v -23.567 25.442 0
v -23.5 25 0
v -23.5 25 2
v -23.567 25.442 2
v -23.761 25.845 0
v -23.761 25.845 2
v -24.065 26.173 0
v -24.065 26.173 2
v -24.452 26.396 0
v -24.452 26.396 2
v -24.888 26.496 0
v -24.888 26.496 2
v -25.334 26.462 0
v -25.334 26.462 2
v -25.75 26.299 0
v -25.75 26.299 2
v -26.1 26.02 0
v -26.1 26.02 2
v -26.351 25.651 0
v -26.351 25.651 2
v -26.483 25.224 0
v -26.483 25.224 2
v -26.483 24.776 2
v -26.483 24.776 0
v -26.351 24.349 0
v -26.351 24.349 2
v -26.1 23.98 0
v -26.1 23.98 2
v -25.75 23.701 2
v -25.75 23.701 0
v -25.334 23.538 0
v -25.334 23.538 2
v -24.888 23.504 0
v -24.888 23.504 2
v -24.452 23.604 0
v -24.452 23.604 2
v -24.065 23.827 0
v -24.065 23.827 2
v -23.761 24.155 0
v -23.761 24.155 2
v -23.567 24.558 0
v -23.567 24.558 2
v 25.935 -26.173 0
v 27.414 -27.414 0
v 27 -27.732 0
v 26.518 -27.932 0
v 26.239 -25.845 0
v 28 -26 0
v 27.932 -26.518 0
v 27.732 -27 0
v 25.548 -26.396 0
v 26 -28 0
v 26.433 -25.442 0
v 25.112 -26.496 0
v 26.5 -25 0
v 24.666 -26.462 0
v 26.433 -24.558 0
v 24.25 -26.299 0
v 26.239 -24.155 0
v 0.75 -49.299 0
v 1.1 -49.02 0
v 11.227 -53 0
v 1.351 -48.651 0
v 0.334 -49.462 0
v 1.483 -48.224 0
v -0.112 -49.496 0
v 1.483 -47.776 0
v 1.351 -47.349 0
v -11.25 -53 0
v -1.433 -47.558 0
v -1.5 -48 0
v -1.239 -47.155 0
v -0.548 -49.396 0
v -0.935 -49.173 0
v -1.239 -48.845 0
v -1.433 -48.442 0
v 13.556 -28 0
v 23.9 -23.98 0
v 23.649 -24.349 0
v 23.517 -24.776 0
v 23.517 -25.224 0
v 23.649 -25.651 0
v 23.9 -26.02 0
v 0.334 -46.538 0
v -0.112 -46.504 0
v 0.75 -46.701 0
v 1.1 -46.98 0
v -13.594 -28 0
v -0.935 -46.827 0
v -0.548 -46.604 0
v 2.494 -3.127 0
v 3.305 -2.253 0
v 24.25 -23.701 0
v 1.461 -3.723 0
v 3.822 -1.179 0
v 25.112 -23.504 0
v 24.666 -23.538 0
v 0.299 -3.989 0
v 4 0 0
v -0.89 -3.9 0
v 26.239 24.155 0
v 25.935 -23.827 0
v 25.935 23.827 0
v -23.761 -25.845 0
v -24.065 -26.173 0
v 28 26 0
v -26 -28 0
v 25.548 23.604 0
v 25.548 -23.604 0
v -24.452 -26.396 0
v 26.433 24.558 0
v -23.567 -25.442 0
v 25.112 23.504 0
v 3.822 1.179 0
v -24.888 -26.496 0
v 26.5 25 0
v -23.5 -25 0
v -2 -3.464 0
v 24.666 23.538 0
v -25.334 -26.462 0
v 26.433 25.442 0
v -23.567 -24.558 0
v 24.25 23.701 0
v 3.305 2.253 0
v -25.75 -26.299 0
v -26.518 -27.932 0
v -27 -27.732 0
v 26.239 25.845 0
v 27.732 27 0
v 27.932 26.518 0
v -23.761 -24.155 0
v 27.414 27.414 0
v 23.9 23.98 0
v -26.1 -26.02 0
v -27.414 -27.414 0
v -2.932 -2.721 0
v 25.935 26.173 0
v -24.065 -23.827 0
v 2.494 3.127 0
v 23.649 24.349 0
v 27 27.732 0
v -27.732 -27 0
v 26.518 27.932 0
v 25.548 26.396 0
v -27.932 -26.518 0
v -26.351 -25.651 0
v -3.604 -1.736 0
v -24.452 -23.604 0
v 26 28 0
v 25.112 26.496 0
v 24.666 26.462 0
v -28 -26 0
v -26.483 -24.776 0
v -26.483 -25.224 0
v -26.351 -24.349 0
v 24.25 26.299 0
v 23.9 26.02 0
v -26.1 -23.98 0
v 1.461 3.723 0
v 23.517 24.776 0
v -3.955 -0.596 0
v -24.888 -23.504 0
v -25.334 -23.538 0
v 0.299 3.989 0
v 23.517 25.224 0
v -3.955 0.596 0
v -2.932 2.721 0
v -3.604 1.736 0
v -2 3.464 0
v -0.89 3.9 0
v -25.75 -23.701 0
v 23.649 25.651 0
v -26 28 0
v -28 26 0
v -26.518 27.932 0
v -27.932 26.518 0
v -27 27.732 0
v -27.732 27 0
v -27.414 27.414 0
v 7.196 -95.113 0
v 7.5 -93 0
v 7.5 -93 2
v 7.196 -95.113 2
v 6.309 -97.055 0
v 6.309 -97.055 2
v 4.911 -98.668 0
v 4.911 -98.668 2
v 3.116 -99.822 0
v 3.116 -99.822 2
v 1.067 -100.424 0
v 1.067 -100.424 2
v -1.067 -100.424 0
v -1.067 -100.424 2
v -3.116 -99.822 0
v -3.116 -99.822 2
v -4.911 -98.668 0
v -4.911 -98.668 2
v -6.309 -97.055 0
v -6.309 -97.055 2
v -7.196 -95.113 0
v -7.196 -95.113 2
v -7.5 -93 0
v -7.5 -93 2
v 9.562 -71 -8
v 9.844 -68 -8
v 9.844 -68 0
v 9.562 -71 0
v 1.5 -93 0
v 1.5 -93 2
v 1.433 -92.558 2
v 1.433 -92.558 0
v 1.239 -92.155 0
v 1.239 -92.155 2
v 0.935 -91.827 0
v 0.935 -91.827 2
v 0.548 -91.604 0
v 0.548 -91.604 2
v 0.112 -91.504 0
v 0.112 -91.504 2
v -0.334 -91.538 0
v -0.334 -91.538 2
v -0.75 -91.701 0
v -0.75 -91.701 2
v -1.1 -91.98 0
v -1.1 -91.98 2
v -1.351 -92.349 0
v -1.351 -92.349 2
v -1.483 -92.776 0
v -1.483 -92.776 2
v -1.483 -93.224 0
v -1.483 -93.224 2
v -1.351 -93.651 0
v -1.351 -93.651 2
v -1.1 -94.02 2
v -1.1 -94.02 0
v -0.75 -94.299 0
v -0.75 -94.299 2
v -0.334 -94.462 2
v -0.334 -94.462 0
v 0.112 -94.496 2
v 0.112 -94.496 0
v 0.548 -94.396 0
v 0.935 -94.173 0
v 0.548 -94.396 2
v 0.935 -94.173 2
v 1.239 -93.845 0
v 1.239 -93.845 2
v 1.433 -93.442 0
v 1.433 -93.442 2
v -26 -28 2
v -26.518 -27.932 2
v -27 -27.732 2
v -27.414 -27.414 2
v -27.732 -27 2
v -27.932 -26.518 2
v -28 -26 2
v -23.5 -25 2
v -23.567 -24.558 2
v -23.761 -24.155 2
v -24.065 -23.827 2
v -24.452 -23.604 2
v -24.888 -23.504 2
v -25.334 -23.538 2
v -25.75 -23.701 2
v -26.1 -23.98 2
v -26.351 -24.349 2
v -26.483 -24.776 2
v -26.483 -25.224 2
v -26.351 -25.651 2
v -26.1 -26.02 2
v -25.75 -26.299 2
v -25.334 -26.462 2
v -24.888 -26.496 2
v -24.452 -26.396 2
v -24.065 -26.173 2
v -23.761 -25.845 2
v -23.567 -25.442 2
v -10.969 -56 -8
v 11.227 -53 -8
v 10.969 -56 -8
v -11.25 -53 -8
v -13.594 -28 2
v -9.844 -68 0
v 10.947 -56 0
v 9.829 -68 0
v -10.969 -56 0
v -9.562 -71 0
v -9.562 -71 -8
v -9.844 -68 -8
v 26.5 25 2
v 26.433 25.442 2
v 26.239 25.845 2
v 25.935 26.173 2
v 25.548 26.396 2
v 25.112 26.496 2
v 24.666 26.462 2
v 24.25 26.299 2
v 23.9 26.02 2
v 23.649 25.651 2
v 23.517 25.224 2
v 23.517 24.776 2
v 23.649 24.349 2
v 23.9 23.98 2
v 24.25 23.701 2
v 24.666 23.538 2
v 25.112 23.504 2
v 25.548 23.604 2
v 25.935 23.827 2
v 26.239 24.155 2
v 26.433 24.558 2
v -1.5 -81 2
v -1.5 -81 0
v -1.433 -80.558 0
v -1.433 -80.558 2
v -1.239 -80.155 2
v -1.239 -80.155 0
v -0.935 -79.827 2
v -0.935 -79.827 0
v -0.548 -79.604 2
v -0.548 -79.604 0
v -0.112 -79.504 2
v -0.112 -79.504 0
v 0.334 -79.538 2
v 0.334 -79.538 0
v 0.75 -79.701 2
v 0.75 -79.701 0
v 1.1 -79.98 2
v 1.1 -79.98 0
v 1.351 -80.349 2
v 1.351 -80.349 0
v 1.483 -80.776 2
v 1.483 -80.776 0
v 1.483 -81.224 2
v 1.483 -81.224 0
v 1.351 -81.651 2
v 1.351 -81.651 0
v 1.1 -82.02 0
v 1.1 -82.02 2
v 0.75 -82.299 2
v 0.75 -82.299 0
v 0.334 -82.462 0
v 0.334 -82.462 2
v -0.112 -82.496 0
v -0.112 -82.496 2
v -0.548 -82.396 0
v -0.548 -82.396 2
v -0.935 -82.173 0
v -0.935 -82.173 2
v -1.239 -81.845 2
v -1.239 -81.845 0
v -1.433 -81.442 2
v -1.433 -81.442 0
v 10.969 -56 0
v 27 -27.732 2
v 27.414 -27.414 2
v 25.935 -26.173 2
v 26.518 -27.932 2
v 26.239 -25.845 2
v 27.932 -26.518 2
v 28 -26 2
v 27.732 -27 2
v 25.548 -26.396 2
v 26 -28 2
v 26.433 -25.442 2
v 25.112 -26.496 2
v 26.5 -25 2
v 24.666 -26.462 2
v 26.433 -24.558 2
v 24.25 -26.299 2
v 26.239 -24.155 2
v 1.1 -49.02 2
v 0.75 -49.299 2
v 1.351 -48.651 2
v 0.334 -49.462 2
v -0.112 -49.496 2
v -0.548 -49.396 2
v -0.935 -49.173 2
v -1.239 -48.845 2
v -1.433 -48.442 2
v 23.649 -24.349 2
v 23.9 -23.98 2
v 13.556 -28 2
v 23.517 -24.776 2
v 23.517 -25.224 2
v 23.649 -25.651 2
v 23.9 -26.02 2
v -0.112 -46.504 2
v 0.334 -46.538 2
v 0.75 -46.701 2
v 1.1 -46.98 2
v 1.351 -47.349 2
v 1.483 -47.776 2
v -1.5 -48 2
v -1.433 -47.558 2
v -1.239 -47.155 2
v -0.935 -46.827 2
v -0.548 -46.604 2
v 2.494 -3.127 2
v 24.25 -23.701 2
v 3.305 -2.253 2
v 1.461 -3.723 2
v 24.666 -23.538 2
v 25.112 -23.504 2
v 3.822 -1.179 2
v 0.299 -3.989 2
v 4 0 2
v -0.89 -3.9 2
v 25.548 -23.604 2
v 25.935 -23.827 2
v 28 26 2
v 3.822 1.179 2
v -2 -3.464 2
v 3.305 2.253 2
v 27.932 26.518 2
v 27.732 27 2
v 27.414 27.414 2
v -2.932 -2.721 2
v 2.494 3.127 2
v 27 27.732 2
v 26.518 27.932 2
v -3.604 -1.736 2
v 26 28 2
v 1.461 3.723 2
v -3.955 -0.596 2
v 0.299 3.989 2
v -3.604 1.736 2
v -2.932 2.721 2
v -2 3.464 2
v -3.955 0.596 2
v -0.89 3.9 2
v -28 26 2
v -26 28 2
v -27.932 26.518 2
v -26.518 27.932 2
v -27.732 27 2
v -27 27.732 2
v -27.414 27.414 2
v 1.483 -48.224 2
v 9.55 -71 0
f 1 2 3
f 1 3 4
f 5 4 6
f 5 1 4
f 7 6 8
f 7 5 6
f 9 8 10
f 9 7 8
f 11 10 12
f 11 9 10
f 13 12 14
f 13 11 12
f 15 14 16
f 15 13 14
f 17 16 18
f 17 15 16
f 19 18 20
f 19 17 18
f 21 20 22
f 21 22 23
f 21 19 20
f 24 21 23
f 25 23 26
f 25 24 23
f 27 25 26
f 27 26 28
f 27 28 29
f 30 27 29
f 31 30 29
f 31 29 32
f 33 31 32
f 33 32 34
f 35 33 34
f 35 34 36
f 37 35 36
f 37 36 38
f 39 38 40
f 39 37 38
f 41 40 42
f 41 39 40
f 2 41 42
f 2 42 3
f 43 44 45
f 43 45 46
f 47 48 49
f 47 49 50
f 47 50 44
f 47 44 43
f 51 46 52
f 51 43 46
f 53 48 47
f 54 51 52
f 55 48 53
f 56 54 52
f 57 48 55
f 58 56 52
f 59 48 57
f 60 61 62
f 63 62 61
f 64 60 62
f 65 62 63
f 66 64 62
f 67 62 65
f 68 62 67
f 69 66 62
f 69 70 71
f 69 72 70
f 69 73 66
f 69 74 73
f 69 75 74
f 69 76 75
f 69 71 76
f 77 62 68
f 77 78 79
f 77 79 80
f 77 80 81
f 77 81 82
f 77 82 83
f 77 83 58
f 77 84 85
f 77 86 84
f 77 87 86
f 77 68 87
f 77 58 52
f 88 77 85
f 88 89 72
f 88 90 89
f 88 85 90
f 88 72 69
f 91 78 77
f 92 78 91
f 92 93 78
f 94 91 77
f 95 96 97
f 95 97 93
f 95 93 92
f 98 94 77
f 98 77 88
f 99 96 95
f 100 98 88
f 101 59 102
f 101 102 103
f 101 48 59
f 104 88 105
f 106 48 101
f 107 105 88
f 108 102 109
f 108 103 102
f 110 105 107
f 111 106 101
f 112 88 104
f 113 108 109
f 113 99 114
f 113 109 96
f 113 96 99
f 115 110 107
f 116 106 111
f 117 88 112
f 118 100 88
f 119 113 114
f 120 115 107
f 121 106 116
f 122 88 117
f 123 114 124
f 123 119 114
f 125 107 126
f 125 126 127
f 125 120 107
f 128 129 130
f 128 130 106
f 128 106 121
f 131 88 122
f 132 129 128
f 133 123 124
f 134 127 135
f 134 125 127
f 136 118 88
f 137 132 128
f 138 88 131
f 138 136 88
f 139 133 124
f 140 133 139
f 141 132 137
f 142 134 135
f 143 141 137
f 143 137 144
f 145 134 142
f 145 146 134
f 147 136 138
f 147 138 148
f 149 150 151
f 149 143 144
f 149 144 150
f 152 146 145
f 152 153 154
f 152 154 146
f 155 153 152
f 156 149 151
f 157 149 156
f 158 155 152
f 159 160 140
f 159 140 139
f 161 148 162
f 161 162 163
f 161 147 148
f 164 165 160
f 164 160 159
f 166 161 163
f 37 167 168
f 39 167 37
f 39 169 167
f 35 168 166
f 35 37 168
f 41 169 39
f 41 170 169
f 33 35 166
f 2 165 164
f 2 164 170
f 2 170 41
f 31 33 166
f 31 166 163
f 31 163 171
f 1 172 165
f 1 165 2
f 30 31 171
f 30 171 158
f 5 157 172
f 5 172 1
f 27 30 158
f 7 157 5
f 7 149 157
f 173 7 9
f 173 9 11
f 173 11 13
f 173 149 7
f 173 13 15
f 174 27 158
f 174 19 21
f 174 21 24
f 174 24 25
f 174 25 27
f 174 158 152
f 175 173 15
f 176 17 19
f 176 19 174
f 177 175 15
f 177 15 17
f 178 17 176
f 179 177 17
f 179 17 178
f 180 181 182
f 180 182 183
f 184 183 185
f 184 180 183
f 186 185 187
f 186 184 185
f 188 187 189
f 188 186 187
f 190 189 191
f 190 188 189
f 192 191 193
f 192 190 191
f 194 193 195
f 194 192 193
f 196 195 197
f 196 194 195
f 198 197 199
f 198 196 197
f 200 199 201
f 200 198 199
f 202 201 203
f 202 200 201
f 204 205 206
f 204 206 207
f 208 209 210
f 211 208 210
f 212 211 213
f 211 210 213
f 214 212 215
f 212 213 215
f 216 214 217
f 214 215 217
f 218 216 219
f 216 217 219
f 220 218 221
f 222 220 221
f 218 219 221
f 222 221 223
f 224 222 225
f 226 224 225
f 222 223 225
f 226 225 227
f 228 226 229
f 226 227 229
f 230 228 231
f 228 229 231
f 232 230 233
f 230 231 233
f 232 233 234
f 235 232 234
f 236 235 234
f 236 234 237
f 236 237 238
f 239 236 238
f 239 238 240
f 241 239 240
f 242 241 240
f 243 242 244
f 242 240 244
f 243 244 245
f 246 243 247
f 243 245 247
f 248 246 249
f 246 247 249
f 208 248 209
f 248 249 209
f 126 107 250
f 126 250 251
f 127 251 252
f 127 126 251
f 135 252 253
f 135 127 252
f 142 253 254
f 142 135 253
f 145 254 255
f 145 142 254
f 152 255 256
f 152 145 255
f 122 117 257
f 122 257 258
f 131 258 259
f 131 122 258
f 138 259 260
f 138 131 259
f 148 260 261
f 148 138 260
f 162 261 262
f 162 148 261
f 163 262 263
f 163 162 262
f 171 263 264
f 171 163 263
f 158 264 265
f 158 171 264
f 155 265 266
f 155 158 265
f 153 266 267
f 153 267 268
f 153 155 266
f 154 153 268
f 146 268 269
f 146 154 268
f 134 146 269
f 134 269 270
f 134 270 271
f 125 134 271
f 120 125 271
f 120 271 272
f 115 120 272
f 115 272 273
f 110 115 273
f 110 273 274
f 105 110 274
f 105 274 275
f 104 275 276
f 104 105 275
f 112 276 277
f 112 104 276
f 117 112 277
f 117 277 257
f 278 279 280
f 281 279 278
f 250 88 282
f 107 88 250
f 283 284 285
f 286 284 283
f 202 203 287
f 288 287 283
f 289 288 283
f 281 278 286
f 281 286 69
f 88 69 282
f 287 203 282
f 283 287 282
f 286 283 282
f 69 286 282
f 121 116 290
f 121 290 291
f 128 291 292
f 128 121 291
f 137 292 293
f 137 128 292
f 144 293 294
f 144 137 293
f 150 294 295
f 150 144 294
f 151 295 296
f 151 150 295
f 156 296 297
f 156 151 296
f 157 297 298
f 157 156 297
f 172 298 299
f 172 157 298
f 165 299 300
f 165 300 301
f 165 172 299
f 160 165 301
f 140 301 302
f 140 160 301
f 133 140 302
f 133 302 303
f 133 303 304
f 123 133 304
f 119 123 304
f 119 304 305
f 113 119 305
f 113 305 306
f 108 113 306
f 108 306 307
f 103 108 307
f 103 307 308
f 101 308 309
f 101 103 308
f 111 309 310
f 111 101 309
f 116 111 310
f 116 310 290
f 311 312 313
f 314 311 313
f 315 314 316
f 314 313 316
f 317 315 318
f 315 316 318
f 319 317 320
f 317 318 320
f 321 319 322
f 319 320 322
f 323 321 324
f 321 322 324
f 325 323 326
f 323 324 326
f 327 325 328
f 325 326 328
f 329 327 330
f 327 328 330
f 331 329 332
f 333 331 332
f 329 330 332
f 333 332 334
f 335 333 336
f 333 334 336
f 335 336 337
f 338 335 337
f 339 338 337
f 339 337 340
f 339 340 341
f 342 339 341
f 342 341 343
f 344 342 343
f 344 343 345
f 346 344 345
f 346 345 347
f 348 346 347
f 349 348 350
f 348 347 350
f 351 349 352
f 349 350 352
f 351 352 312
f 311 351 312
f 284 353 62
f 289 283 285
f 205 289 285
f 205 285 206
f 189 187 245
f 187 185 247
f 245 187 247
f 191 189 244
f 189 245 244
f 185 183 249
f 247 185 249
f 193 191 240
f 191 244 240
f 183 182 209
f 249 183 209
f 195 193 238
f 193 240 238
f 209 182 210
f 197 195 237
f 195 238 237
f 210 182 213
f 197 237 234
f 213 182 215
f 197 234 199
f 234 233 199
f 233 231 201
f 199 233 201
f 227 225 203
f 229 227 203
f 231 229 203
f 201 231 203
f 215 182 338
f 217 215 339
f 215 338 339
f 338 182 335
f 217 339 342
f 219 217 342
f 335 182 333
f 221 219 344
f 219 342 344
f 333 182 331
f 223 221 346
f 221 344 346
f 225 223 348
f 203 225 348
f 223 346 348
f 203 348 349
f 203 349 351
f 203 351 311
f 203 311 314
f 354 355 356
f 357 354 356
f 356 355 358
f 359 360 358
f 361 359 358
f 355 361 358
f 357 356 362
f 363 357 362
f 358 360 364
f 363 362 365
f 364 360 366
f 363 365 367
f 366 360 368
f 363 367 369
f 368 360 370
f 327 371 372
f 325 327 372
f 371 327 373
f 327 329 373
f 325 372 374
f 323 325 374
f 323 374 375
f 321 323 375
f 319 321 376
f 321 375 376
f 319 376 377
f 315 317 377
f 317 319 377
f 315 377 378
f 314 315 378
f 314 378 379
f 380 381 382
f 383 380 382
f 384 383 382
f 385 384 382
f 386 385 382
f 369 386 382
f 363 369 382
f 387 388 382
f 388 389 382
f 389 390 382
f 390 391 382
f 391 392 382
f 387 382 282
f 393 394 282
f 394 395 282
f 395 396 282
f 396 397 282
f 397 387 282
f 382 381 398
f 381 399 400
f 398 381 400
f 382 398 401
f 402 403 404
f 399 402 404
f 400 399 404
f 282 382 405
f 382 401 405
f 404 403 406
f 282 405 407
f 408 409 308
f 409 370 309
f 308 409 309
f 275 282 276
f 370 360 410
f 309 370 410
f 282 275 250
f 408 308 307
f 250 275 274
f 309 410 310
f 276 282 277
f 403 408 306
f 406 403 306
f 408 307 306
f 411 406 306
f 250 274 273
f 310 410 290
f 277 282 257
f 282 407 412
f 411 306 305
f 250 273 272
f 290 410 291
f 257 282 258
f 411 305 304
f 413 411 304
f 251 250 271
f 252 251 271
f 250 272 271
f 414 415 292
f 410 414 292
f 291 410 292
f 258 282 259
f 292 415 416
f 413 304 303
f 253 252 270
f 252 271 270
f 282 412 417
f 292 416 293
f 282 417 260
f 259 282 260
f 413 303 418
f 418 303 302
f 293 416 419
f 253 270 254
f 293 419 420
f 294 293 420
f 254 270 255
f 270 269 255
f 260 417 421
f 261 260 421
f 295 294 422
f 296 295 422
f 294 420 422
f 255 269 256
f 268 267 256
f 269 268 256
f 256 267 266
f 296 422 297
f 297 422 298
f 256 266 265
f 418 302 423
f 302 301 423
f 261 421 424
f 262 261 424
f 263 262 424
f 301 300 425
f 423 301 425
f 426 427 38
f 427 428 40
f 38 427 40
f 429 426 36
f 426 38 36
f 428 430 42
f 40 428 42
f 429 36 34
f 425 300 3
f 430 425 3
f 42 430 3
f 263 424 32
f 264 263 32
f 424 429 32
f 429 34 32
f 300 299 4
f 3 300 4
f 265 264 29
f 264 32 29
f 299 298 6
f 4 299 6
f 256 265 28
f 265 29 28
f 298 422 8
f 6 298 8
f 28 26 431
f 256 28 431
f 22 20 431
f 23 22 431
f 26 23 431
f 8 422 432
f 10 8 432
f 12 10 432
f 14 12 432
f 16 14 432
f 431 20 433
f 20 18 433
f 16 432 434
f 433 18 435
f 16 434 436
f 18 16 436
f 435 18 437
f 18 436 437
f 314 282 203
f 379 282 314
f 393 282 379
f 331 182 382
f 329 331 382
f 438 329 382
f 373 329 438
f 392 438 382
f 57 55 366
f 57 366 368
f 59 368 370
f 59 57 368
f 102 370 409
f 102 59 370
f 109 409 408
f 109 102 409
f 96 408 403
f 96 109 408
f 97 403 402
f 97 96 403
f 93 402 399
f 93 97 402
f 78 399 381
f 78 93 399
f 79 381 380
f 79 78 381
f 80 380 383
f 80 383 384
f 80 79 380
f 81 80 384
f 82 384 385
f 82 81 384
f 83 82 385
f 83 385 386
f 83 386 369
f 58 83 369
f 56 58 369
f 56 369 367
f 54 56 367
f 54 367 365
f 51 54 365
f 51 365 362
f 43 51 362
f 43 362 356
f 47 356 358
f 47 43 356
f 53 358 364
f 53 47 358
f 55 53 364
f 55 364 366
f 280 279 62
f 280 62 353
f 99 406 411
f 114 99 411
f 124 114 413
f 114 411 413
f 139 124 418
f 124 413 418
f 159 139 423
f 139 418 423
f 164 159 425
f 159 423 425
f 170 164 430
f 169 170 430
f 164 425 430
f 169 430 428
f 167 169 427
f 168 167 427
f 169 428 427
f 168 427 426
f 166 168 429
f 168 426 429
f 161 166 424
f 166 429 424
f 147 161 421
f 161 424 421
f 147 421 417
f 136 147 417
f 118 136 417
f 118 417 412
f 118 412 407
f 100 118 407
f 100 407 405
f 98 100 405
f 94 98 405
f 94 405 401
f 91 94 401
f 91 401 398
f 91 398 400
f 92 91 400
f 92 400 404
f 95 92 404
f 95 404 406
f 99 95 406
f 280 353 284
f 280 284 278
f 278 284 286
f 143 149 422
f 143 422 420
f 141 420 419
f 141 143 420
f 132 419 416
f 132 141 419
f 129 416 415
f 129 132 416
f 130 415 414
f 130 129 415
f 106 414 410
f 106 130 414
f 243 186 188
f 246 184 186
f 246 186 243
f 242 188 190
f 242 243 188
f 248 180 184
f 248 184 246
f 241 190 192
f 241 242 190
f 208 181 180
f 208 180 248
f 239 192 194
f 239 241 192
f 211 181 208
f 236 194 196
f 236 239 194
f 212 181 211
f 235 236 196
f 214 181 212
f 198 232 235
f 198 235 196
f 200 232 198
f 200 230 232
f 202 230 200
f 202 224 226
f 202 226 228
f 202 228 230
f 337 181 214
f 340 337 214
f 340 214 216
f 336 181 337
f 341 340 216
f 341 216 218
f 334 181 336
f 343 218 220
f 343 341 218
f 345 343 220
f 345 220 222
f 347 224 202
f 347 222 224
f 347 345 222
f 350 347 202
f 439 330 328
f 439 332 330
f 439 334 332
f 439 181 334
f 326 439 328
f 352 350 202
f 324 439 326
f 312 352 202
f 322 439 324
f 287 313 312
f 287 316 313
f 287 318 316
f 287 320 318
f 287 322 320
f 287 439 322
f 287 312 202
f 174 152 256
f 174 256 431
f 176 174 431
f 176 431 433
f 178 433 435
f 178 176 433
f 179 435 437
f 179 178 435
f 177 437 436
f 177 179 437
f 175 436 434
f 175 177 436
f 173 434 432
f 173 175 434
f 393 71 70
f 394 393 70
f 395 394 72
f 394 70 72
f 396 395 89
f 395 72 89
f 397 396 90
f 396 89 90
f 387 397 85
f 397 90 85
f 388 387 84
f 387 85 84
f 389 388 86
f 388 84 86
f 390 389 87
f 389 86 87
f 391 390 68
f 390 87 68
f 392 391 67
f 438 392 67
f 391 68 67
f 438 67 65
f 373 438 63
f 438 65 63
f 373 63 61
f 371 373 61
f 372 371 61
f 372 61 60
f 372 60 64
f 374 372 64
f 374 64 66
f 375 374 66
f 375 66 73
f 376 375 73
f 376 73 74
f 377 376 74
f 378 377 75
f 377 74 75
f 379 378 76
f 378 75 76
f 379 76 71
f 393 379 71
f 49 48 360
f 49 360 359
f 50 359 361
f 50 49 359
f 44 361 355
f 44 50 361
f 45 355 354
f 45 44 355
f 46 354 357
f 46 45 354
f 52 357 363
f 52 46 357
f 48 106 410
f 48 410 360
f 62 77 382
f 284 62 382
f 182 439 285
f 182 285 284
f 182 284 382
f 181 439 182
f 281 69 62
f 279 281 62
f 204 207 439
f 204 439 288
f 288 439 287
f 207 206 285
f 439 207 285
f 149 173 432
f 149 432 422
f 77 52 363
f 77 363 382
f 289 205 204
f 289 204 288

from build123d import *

# Parameters (mm, degrees)
SKETCH2_R           = 1.5
BOSS_EXTRUDE1_DEPTH = 2
SKETCH3_R           = 4
CUT_EXTRUDE1_DEPTH  = 10
BOSS_EXTRUDE2_DEPTH = 8
SKETCH5_R           = 1.5
CUT_EXTRUDE2_DEPTH  = 2
SKETCH6_R           = 7.5
BOSS_EXTRUDE3_DEPTH = 2
SKETCH7_R           = 1.5
CUT_EXTRUDE3_DEPTH  = 2


with BuildPart() as part:
    # Sketch2 → Boss-Extrude1 (new body)
    with BuildSketch(Plane.XY):
        with BuildLine():
            Line((-13.59375, -28), (-26, -28))
            ThreePointArc((-26, -28), (-27.414213562, -27.414213562), (-28, -26))
            Line((-28, -26), (-28, 26))
            ThreePointArc((-28, 26), (-27.414213562, 27.414213562), (-26, 28))
            Line((-26, 28), (26, 28))
            ThreePointArc((26, 28), (27.414213562, 27.414213562), (28, 26))
            Line((28, 26), (28, -26))
            ThreePointArc((28, -26), (27.414213562, -27.414213562), (26, -28))
            Line((26, -28), (13.555660481, -28))
            Line((13.555660481, -28), (7.5, -93))
            Line((7.5, -93), (-7.5, -93))
            Line((-7.5, -93), (-13.59375, -28))
        make_face()
        with Locations((25, 25)):
            Circle(SKETCH2_R, mode=Mode.SUBTRACT)
        with Locations((25, -25)):
            Circle(SKETCH2_R, mode=Mode.SUBTRACT)
        with Locations((-25, -25)):
            Circle(SKETCH2_R, mode=Mode.SUBTRACT)
        with Locations((-25, 25)):
            Circle(SKETCH2_R, mode=Mode.SUBTRACT)
    extrude(amount=BOSS_EXTRUDE1_DEPTH)

    # Sketch3 → Cut-Extrude1 (cut)
    with BuildSketch(Plane.XY.offset(2)):
        Circle(SKETCH3_R)
    extrude(amount=-CUT_EXTRUDE1_DEPTH, mode=Mode.SUBTRACT)

    # Sketch4 → Boss-Extrude2 (add)
    with BuildSketch(Plane(origin=(0, 0, 0), x_dir=(-1, 0, 0), z_dir=(0, 0, -1))):
        Polygon((-11.226560296, -53), (-10.96875, -56), (10.96875, -56), (11.25, -53), align=None)
        Polygon((-9.84375, -68), (-9.5625, -71), (9.5625, -71), (9.84375, -68), align=None)
    extrude(amount=BOSS_EXTRUDE2_DEPTH)

    # Sketch5 → Cut-Extrude2 (cut)
    with BuildSketch(Plane(origin=(0, 0, 0), x_dir=(-1, 0, 0), z_dir=(0, 0, -1))):
        with Locations((0, -48)):
            Circle(SKETCH5_R)
        with Locations((0, -81)):
            Circle(SKETCH5_R)
    extrude(amount=-CUT_EXTRUDE2_DEPTH, mode=Mode.SUBTRACT)

    # Sketch6 → Boss-Extrude3 (add)
    with BuildSketch(Plane(origin=(0, 0, 0), x_dir=(-1, 0, 0), z_dir=(0, 0, -1))):
        with Locations((0, -93)):
            Circle(SKETCH6_R)
    extrude(amount=-BOSS_EXTRUDE3_DEPTH)

    # Sketch7 → Cut-Extrude3 (cut)
    with BuildSketch(Plane.XY.offset(2)):
        with Locations((0, -93)):
            Circle(SKETCH7_R)
    extrude(amount=-CUT_EXTRUDE3_DEPTH, mode=Mode.SUBTRACT)


solid = part.part
